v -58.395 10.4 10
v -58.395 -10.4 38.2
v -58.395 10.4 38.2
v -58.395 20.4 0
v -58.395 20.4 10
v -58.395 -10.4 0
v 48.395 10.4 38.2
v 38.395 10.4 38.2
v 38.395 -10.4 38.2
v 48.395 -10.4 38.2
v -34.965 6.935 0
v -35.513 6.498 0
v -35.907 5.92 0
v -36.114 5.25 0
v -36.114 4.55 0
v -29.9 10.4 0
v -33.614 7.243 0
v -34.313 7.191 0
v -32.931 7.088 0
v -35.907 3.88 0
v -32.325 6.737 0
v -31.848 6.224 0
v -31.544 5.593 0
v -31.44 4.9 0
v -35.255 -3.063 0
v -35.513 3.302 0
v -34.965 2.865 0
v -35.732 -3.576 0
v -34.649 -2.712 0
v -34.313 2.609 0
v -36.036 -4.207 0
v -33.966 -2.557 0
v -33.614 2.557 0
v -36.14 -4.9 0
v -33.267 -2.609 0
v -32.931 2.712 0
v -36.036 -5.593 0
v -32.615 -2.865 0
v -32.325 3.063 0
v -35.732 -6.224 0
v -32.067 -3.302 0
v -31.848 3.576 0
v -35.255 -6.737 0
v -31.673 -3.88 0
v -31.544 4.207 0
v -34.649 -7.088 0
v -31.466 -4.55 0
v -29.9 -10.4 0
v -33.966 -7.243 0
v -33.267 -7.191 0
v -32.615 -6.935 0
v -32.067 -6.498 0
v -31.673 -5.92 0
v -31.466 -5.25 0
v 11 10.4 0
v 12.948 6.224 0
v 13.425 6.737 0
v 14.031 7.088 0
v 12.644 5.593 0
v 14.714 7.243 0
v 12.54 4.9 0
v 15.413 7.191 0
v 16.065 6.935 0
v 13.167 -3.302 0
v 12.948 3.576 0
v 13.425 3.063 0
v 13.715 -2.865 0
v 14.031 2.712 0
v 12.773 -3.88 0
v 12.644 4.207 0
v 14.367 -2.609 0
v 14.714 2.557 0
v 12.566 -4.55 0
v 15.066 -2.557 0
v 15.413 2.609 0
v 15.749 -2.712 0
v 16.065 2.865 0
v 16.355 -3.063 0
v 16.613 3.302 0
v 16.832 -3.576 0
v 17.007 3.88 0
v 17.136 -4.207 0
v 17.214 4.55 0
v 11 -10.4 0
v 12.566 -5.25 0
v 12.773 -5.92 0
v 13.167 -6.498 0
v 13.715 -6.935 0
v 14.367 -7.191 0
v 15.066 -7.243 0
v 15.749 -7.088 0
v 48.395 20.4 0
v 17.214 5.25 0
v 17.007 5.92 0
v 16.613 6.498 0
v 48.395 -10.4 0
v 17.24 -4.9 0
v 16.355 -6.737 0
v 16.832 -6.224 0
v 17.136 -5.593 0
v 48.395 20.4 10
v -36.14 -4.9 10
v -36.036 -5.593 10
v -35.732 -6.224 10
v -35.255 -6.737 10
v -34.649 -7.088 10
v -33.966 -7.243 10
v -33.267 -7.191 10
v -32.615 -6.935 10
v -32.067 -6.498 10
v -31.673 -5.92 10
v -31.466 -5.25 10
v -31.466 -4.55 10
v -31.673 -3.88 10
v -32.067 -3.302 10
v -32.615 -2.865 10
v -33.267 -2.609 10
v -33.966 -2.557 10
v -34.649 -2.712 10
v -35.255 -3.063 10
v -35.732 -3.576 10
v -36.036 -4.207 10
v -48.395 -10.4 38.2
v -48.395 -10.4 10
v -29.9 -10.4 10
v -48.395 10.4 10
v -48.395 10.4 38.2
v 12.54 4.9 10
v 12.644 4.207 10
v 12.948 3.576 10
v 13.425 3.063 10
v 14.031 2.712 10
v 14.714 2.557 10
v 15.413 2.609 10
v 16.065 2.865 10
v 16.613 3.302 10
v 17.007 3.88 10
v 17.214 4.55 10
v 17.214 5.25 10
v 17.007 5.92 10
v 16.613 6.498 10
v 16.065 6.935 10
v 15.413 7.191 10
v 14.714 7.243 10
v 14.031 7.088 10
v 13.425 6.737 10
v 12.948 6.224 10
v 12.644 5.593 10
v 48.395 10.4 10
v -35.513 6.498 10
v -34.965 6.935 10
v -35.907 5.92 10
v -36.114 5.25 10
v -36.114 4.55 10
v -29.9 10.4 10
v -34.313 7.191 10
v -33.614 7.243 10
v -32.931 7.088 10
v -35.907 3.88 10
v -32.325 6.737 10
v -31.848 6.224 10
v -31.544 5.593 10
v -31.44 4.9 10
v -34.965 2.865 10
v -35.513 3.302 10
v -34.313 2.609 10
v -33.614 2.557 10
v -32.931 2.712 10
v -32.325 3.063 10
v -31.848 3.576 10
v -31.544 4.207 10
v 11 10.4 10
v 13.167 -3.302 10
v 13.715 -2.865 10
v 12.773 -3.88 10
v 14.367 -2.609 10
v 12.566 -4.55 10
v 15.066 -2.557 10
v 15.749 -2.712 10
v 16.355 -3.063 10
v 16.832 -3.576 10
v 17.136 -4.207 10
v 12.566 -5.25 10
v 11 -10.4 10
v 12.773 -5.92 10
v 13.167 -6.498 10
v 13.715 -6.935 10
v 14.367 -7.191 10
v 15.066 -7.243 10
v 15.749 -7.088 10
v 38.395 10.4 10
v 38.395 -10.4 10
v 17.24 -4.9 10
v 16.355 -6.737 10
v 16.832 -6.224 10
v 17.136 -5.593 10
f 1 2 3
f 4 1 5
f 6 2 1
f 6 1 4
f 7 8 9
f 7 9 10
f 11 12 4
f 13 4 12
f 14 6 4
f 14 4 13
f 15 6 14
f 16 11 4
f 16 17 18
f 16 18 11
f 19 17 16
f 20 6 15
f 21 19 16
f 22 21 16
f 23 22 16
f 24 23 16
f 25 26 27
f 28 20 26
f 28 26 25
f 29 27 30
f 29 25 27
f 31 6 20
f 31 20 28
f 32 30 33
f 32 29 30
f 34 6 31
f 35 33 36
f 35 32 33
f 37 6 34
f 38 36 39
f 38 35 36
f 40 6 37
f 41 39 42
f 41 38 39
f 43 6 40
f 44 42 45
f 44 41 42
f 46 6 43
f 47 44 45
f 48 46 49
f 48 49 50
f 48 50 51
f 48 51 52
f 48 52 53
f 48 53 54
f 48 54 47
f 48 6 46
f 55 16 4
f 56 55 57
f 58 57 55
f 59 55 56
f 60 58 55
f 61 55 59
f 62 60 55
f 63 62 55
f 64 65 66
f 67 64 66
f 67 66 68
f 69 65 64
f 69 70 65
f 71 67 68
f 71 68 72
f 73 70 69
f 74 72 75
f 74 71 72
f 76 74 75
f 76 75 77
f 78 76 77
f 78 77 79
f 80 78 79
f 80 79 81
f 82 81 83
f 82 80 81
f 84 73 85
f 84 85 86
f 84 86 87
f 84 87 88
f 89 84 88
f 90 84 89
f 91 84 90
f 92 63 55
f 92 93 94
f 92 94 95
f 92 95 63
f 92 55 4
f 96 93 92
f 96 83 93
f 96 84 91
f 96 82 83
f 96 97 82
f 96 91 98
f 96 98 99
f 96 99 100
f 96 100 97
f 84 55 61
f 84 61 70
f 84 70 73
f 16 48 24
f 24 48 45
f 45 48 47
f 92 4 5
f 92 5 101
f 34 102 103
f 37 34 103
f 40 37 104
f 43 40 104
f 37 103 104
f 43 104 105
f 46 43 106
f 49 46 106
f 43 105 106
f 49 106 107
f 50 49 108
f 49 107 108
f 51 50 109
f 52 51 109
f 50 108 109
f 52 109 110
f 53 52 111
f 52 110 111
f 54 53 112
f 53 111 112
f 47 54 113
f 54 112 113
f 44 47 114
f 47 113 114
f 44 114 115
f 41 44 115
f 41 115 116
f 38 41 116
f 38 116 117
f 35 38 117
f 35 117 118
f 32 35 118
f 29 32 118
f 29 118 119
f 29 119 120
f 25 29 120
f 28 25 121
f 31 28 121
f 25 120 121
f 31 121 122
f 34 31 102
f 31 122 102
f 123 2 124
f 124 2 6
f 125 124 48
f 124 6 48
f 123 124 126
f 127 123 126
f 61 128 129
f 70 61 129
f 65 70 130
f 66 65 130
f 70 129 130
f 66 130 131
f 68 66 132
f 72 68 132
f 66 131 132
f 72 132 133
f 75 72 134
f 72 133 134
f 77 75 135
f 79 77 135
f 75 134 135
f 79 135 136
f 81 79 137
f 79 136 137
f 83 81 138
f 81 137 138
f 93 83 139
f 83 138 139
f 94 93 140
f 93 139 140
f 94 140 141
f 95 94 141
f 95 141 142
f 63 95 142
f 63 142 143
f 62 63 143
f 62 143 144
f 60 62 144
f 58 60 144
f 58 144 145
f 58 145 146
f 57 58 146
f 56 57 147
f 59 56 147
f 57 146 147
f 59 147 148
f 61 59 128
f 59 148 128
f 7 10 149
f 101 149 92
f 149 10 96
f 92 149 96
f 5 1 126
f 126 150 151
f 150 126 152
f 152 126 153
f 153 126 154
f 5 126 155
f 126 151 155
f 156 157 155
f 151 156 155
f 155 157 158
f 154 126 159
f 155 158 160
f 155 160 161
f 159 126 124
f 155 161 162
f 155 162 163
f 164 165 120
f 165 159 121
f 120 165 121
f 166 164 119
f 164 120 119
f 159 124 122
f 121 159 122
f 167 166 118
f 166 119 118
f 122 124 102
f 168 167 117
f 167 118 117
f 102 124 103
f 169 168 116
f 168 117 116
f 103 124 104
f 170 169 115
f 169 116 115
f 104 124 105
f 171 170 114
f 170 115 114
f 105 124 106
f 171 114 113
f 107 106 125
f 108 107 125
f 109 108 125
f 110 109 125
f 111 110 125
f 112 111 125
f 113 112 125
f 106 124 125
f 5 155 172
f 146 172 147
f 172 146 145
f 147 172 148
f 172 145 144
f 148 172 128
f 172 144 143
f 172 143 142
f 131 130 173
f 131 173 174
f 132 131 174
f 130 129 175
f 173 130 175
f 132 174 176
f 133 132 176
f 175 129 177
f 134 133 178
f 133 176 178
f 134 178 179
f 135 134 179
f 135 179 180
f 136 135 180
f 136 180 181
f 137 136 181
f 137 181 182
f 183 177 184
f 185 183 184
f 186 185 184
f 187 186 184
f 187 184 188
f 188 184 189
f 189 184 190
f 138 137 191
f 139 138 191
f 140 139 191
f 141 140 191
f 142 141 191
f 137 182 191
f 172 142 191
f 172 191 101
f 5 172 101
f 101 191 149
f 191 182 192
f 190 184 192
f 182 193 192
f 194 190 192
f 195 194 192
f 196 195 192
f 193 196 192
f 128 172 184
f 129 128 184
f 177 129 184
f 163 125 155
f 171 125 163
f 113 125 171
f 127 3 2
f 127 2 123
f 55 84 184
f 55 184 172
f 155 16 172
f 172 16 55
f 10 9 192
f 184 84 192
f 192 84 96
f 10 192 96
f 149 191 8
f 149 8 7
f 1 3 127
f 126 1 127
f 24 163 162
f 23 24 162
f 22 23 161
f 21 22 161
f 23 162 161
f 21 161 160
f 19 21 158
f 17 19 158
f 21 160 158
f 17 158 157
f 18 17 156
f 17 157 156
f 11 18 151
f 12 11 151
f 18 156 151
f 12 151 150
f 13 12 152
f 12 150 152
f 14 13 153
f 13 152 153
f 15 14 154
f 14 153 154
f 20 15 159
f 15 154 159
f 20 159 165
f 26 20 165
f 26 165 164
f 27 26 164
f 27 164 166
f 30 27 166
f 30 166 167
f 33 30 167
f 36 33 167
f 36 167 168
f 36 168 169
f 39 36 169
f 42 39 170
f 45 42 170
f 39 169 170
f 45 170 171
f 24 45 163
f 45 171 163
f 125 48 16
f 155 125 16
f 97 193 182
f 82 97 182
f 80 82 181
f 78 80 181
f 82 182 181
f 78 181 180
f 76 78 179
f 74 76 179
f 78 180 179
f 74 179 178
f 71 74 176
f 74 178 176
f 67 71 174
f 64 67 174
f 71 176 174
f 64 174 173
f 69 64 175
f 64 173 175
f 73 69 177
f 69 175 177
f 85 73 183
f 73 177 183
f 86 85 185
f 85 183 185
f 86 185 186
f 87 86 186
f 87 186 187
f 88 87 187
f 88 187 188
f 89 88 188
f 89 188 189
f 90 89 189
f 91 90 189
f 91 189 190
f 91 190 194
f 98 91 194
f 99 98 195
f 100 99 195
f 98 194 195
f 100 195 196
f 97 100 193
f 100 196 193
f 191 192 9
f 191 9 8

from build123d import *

# Parameters (mm, degrees)
SKETCH1_W           = 18.495
SKETCH1_H           = 20.8
SKETCH1_W_2         = 10
SKETCH1_W_3         = 37.395
BOSS_EXTRUDE1_DEPTH = 10
SKETCH2_W           = 10
SKETCH2_H           = 20.8
BOSS_EXTRUDE2_DEPTH = 28.2
SKETCH6_W           = 106.79
SKETCH6_H           = 10
BOSS_EXTRUDE4_DEPTH = 10
SKETCH9_R           = 2.35
CUT_EXTRUDE1_DEPTH  = 10


with BuildPart() as part:
    # Sketch1 → Boss-Extrude1 (new body)
    with BuildSketch(Plane.XY):
        with Locations((-39.1475, 0)):
            Rectangle(SKETCH1_W, SKETCH1_H)
        with Locations((-53.395, 0)):
            Rectangle(SKETCH1_W_2, SKETCH1_H)
        with Locations((29.6975, 0)):
            Rectangle(SKETCH1_W_3, SKETCH1_H)
    extrude(amount=BOSS_EXTRUDE1_DEPTH)

    # Sketch2 → Boss-Extrude2 (add)
    with BuildSketch(Plane.XY.offset(10)):
        with Locations((43.395, 0)):
            Rectangle(SKETCH2_W, SKETCH2_H)
        with Locations((-53.395, 0)):
            Rectangle(SKETCH2_W, SKETCH2_H)
    extrude(amount=BOSS_EXTRUDE2_DEPTH)

    # Sketch6 → Boss-Extrude4 (add)
    with BuildSketch(Plane(origin=(0, 10.4, 0), x_dir=(1, 0, 0), z_dir=(0, 1, 0))):
        with Locations((-5, -5)):
            Rectangle(SKETCH6_W, SKETCH6_H)
    extrude(amount=BOSS_EXTRUDE4_DEPTH)

    # Sketch9 → Cut-Extrude1 (cut)
    with BuildSketch(Plane.XY.offset(10)):
        with Locations((14.89, -4.9)):
            Circle(SKETCH9_R)
        with Locations(Location((14.89, 4.9, 0), (0, 0, 180))):
            Circle(SKETCH9_R)
        with Locations(Location((-33.79, -4.9, 0), (0, 0, 180))):
            Circle(SKETCH9_R)
        with Locations((-33.79, 4.9)):
            Circle(SKETCH9_R)
    extrude(amount=-CUT_EXTRUDE1_DEPTH, mode=Mode.SUBTRACT)


solid = part.part
